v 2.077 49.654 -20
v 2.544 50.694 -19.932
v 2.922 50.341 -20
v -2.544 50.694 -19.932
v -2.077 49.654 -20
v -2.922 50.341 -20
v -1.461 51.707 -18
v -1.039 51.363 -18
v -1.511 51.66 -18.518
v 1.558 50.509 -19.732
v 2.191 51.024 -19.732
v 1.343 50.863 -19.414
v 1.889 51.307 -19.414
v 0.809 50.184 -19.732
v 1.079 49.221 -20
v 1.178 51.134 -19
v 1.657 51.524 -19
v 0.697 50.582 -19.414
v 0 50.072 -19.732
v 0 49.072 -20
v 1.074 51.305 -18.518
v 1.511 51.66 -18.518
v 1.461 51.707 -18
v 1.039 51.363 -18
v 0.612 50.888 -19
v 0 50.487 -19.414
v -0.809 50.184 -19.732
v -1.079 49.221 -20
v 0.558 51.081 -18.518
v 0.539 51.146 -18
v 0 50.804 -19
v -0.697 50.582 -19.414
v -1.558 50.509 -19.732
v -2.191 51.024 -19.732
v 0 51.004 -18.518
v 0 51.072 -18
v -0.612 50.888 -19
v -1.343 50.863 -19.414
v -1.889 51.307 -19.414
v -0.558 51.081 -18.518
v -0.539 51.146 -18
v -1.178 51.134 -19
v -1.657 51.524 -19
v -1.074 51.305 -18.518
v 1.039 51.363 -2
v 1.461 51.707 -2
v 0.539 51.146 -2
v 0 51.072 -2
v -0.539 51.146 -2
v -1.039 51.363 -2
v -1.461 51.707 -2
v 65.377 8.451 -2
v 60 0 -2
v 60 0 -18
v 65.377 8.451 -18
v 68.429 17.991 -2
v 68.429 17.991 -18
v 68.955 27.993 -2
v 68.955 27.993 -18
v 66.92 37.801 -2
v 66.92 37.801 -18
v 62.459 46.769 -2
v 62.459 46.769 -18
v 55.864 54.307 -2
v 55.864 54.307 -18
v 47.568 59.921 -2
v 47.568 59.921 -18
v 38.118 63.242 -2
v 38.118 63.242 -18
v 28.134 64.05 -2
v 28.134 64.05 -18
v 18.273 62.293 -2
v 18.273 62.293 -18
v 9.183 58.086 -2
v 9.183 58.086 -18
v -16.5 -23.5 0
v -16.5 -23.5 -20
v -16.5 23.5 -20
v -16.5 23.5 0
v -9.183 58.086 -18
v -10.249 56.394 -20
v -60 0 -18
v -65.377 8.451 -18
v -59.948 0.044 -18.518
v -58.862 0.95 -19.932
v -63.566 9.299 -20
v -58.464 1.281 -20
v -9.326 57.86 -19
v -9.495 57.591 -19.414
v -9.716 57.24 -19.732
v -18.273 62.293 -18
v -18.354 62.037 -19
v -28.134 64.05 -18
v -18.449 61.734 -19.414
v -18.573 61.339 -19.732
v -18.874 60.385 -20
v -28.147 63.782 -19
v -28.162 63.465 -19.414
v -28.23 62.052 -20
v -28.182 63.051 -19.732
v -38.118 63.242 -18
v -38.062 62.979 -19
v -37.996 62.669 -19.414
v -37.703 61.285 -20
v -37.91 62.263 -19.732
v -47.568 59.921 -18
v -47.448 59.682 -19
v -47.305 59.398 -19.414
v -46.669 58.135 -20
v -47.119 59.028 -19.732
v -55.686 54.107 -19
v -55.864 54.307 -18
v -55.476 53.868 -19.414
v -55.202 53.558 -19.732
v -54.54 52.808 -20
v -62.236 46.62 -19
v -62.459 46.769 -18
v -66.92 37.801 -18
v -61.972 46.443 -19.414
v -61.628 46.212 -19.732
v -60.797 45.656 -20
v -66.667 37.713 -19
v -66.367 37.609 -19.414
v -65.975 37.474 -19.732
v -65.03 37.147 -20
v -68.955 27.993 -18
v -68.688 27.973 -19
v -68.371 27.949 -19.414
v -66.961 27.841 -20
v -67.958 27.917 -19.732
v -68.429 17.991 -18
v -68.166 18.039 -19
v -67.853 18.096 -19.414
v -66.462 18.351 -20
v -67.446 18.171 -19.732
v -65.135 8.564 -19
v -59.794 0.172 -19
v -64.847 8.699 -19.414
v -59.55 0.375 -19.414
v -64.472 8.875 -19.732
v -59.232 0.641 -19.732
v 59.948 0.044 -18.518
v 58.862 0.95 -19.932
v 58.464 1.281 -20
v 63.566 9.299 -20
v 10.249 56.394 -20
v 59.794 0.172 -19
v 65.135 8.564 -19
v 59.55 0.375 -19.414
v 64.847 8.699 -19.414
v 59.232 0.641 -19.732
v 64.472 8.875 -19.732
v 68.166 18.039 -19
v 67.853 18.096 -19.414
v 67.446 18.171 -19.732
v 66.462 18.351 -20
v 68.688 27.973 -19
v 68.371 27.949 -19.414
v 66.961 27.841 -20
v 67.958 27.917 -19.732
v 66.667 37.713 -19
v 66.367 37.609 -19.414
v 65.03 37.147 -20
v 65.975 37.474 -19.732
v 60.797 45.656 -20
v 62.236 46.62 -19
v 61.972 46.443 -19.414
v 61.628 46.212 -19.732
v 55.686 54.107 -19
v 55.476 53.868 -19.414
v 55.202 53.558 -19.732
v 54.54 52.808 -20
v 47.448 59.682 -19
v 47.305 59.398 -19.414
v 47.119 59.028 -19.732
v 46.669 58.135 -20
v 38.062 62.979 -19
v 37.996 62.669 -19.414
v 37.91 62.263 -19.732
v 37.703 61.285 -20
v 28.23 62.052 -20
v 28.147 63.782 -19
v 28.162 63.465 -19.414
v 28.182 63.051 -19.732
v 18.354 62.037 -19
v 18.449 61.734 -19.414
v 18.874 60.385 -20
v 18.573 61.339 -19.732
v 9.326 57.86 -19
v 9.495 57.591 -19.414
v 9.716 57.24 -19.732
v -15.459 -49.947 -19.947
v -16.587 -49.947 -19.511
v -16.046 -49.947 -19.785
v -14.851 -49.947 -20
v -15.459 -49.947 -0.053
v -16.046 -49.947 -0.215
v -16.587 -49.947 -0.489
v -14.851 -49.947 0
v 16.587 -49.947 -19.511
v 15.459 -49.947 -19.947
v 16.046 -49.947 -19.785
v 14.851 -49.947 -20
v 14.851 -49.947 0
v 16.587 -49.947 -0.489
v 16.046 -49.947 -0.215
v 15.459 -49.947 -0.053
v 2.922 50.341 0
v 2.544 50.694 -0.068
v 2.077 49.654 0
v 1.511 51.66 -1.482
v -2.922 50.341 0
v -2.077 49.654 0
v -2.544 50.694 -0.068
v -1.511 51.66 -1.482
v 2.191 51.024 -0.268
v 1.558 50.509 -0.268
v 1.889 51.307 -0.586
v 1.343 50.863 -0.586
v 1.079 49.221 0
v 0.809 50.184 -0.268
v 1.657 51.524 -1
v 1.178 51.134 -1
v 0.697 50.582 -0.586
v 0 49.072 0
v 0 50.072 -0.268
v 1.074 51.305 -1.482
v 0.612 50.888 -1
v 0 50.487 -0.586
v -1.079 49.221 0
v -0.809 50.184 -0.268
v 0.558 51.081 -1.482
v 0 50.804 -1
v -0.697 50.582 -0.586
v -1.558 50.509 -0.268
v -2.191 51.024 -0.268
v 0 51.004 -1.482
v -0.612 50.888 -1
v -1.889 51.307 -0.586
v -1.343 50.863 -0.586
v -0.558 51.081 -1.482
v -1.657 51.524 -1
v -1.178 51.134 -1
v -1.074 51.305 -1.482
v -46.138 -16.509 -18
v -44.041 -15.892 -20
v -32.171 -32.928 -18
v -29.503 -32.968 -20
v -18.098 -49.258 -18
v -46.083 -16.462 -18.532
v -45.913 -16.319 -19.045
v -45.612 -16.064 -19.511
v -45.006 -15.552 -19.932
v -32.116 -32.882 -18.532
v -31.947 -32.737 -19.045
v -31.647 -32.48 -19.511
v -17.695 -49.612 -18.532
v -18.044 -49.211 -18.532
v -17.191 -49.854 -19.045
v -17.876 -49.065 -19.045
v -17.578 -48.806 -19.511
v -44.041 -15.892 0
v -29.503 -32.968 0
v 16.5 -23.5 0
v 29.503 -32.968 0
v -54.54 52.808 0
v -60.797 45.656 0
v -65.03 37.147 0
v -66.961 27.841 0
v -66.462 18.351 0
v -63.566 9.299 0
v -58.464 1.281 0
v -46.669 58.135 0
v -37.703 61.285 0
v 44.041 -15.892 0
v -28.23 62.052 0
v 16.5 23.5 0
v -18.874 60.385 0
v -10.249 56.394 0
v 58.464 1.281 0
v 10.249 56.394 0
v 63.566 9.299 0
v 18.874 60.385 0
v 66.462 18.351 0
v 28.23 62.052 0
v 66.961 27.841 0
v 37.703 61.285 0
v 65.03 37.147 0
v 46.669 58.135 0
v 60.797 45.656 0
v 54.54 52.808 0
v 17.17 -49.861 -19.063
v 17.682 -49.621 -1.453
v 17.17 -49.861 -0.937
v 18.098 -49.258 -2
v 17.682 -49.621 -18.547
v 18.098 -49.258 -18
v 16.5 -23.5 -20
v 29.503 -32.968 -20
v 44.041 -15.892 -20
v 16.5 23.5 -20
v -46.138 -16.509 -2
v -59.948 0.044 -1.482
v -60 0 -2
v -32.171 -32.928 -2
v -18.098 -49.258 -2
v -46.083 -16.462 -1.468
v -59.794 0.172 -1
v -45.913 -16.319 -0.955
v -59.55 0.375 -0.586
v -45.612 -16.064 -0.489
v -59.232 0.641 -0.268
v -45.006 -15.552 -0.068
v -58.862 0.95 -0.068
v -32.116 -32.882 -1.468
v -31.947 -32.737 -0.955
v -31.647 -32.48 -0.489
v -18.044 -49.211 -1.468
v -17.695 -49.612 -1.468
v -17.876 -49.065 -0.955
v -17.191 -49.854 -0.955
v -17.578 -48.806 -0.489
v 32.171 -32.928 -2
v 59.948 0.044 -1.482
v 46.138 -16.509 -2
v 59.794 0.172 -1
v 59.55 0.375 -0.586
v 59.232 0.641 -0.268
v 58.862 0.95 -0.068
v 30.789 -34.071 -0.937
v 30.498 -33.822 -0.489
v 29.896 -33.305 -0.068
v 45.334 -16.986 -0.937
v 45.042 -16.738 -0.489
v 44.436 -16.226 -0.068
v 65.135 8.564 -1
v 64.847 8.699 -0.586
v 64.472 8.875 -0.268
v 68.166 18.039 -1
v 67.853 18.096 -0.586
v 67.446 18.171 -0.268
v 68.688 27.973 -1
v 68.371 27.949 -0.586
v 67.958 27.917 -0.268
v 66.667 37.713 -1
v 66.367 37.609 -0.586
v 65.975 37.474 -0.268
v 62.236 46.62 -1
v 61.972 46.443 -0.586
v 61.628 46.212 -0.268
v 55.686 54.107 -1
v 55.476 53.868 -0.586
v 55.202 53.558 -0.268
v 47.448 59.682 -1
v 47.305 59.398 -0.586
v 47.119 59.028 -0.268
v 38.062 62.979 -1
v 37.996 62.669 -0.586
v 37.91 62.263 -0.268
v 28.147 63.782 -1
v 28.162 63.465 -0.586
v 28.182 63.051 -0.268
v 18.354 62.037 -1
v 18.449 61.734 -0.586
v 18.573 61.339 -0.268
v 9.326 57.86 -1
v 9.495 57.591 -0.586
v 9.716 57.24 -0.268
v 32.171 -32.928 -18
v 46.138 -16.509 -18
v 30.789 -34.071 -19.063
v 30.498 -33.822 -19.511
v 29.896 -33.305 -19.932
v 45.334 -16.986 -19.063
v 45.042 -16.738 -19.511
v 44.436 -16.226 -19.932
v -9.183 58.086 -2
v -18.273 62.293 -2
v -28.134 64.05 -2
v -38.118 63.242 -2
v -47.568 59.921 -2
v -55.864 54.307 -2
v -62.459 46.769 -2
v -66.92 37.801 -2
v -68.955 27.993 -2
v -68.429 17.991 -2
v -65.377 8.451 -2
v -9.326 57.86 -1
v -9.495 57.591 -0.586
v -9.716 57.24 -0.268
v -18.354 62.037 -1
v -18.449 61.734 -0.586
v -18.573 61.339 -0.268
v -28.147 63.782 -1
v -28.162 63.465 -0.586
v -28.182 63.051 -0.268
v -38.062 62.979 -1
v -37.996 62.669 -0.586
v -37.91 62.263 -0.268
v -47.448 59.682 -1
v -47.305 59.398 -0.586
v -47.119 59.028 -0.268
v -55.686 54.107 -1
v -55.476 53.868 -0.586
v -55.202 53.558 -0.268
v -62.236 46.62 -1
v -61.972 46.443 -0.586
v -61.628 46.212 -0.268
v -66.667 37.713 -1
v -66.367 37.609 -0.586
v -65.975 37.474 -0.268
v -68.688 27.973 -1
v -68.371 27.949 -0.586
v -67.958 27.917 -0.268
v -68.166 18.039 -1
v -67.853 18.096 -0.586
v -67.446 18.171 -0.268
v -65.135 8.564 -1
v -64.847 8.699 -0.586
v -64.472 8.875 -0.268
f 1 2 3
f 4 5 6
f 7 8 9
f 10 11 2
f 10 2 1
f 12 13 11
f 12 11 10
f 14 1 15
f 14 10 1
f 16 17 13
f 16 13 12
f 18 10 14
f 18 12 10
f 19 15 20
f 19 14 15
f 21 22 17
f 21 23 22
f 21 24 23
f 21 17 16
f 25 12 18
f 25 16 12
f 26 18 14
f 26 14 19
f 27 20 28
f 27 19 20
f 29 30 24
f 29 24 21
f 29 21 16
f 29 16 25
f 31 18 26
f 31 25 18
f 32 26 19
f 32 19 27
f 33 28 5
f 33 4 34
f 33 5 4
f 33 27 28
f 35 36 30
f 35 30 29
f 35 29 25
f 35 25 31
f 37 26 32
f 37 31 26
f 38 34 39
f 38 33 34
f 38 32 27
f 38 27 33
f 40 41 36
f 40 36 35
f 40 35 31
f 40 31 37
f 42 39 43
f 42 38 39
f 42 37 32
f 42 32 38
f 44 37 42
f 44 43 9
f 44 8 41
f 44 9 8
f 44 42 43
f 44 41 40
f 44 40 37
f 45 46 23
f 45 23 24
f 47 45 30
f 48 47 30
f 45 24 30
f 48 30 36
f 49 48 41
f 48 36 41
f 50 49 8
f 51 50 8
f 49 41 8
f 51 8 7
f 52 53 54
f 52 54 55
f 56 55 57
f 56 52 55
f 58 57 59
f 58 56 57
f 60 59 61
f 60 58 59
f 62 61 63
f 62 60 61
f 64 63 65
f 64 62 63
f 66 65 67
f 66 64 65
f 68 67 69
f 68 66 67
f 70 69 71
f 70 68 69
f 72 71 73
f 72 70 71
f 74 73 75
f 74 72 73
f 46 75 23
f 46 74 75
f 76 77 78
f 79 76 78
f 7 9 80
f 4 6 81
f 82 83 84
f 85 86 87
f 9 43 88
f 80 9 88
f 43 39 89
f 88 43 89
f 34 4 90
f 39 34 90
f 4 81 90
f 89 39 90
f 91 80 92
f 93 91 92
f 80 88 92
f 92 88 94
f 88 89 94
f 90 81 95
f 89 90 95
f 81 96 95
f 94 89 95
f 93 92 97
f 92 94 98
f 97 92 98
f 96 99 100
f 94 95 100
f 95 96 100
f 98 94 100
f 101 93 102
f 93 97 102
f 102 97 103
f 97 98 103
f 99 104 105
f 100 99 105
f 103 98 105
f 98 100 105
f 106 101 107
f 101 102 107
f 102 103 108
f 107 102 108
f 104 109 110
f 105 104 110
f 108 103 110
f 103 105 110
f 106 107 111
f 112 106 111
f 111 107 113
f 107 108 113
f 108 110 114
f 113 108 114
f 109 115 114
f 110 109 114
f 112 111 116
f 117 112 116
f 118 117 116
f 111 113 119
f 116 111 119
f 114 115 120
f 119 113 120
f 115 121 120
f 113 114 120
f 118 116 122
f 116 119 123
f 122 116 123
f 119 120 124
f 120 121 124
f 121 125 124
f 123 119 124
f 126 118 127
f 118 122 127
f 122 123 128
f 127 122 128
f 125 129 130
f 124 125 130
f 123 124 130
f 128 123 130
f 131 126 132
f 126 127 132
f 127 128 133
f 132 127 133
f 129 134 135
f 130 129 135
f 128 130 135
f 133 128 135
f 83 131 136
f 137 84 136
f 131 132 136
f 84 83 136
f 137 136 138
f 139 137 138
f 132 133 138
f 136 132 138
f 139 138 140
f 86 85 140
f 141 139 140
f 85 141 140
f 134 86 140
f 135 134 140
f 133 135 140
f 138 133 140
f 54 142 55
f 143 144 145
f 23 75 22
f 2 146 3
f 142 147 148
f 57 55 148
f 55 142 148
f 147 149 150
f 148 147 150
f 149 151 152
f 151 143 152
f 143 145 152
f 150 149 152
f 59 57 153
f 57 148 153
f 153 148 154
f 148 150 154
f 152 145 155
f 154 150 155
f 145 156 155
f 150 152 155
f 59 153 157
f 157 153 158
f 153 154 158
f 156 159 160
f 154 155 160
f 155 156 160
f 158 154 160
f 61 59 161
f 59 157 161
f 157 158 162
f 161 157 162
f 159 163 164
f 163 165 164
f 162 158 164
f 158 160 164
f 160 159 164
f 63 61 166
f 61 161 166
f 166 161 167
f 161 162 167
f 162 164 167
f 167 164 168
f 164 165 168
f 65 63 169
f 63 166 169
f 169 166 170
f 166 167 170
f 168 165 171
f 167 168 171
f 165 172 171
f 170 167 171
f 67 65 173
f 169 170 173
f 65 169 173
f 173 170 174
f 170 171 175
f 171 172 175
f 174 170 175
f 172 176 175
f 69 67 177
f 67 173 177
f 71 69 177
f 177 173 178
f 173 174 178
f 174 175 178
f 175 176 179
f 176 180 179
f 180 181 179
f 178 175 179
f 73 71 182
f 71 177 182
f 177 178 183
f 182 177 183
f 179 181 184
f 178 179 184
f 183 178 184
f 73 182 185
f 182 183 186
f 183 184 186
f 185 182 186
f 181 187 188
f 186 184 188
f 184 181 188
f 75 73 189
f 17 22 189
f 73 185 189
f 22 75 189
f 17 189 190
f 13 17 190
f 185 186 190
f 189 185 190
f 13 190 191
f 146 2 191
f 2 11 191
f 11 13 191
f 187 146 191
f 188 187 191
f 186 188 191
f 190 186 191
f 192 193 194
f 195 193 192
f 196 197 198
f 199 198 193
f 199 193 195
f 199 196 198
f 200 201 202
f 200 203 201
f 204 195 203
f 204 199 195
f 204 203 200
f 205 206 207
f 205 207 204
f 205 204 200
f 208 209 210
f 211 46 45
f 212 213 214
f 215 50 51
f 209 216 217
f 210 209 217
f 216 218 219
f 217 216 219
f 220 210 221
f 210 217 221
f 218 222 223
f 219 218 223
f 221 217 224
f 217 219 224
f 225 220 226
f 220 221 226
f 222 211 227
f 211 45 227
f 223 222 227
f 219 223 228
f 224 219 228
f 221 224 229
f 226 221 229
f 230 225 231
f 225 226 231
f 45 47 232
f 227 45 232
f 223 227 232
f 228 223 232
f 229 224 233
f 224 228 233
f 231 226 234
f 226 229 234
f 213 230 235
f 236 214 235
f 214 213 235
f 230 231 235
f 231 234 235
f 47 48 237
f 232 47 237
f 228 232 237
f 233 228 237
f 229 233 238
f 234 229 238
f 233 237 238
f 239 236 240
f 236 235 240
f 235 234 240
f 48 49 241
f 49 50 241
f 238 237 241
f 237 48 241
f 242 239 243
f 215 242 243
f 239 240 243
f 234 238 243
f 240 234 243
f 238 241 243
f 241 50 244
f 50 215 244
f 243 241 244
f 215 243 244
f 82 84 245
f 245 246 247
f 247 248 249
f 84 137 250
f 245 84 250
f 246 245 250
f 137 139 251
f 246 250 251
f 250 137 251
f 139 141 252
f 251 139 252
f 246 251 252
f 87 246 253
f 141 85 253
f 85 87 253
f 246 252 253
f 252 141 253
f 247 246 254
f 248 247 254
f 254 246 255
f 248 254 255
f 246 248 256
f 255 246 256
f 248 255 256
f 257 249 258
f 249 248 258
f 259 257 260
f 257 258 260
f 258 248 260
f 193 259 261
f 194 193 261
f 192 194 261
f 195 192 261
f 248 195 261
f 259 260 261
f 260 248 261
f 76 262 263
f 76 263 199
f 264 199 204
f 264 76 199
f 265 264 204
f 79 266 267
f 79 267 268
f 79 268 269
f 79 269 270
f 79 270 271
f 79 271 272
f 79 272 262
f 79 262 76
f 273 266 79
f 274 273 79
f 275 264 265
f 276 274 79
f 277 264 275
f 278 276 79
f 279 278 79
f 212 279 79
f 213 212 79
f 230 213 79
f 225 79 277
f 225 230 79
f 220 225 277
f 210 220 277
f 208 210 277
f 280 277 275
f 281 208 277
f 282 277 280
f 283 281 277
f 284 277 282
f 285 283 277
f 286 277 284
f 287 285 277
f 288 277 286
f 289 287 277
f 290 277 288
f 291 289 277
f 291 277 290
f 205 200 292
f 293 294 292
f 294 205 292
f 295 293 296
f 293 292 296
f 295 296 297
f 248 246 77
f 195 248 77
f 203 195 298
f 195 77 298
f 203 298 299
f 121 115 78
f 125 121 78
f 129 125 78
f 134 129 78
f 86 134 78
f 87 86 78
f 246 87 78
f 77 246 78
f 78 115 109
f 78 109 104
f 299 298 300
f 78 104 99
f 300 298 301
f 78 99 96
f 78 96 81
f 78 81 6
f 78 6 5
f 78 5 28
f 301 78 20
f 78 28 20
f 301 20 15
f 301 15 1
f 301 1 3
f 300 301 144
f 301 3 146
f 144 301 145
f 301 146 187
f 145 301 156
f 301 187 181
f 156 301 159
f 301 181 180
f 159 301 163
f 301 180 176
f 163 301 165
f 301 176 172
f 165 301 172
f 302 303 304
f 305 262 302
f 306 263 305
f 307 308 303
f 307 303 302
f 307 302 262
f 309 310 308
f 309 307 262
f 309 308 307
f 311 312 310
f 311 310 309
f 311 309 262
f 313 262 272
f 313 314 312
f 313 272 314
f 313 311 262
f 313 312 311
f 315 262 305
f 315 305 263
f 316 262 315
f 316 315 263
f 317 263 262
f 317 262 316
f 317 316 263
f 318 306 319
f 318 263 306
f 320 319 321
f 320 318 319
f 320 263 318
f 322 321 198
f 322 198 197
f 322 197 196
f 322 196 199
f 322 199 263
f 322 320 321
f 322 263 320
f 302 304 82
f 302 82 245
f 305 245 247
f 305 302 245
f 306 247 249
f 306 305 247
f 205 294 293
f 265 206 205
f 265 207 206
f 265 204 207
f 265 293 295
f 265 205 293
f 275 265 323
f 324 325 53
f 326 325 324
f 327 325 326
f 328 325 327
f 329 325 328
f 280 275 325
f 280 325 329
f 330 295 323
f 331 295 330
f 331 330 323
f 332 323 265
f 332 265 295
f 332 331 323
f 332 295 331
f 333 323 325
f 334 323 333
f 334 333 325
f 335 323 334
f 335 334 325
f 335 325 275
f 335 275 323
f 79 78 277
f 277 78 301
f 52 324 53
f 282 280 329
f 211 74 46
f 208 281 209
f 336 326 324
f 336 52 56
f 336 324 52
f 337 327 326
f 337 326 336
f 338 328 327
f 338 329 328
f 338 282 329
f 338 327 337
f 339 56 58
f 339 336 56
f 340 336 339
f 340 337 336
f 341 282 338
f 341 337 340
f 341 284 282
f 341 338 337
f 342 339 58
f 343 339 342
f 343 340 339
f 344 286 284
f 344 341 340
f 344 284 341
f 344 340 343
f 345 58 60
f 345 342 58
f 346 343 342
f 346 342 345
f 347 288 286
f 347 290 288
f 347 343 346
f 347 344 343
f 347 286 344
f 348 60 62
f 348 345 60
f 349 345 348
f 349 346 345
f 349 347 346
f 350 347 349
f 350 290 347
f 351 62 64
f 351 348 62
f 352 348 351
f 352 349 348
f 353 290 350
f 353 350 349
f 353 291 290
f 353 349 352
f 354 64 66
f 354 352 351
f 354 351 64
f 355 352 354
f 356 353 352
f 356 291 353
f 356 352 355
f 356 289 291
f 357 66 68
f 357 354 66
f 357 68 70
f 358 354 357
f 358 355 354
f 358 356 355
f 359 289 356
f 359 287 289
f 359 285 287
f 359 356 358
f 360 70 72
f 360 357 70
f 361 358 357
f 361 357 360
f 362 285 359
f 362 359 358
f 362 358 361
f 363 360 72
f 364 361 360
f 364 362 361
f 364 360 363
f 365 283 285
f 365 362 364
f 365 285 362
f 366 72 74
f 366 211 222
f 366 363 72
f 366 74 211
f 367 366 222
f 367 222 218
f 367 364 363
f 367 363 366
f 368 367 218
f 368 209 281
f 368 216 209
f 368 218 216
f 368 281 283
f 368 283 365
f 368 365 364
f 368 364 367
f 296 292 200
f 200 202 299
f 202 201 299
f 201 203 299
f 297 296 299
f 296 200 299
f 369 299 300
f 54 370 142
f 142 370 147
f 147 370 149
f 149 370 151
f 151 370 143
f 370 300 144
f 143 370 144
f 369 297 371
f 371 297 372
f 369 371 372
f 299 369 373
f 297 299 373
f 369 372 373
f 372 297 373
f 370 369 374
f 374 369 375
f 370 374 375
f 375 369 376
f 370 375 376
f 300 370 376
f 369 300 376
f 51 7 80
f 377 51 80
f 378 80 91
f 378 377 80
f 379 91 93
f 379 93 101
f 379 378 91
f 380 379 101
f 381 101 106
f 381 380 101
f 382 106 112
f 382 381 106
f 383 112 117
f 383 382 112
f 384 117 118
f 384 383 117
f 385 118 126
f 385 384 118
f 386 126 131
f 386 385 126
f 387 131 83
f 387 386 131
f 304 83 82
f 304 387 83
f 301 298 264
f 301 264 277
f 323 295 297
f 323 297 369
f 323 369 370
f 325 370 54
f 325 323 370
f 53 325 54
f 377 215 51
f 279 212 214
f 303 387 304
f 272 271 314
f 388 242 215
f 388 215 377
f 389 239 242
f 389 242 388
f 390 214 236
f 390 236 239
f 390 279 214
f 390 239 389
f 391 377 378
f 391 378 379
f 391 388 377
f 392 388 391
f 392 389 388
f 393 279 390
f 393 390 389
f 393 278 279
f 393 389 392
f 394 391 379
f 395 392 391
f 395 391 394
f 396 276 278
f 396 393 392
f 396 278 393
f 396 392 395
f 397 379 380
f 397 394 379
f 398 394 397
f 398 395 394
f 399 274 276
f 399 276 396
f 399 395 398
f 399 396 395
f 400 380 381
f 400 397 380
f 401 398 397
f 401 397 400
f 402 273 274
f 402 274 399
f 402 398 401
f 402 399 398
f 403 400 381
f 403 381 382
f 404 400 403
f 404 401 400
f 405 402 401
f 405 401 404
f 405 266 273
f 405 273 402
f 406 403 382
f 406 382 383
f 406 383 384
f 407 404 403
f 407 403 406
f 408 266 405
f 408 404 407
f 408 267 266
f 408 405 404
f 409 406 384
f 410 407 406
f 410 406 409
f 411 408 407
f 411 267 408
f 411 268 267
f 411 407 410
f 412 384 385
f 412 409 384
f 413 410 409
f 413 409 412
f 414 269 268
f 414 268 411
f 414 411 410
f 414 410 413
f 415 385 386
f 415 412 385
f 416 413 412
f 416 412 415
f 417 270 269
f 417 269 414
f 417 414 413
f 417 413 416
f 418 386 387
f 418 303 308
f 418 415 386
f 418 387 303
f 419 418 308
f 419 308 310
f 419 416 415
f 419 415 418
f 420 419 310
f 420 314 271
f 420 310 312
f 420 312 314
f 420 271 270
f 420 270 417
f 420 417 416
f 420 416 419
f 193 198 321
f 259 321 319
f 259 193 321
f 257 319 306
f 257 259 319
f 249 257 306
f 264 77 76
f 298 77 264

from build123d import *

# Parameters (mm, degrees)
DODANIE_WYCI_GNI_CIE1_DEPTH     = 20
ZAOKR_GLENIE1_R                 = 2
WYTNIJ_WYCI_GNI_CIE1_DEPTH      = 97.32487505
WYTNIJ_WYCI_GNI_CIE1_DEPTH_BACK = 97.32487505
SZKIC4_W                        = 33
SZKIC4_H                        = 47


with BuildPart() as part:
    # Szkic1 → Dodanie-wyciągnięcie1 (new body)
    with BuildSketch(Plane.XY):
        with BuildLine():
            Line((-17.5, -49.947466261), (17.5, -49.947466261))
            ThreePointArc((17.5, -49.947466261), (38.871825844, -25.07740374), (59.999977002, 0))
            ThreePointArc((59.999977002, 0), (55.026266869, 55.026269155), (0, 50.052533739))
            ThreePointArc((0, 50.052533739), (-55.026266869, 55.026269155), (-59.999977002, 0))
            ThreePointArc((-59.999977002, 0), (-38.871825844, -25.07740374), (-17.5, -49.947466261))
        make_face()
    extrude(amount=-DODANIE_WYCI_GNI_CIE1_DEPTH)

    # Zaokrąglenie1
    zaokr_glenie1_edges = [part.edges().sort_by_distance(p)[0] for p in [
        (55.026266869, 55.026269155, -20),
        (38.871825844, -25.07740374, -20),
        (-38.871825844, -25.07740374, -20),
        (38.871825844, -25.07740374, 0),
        (55.026266869, 55.026269155, 0),
        (-55.026266869, 55.026269155, 0),
        (-38.871825844, -25.07740374, 0),
        (-55.026266869, 55.026269155, -20),
        (-17.5, -49.947466261, -10),
        (17.5, -49.947466261, -10),
        (0, 50.052533739, -10),
    ]]
    fillet(zaokr_glenie1_edges, radius=ZAOKR_GLENIE1_R)

    # Szkic4 → Wytnij-wyciągnięcie1 (cut, two sides: drawn at the far end of the back side and taken through both)
    with BuildSketch(Plane.XY.offset(-WYTNIJ_WYCI_GNI_CIE1_DEPTH_BACK)):
        Rectangle(SZKIC4_W, SZKIC4_H)
    extrude(amount=WYTNIJ_WYCI_GNI_CIE1_DEPTH + WYTNIJ_WYCI_GNI_CIE1_DEPTH_BACK, mode=Mode.SUBTRACT)


solid = part.part
